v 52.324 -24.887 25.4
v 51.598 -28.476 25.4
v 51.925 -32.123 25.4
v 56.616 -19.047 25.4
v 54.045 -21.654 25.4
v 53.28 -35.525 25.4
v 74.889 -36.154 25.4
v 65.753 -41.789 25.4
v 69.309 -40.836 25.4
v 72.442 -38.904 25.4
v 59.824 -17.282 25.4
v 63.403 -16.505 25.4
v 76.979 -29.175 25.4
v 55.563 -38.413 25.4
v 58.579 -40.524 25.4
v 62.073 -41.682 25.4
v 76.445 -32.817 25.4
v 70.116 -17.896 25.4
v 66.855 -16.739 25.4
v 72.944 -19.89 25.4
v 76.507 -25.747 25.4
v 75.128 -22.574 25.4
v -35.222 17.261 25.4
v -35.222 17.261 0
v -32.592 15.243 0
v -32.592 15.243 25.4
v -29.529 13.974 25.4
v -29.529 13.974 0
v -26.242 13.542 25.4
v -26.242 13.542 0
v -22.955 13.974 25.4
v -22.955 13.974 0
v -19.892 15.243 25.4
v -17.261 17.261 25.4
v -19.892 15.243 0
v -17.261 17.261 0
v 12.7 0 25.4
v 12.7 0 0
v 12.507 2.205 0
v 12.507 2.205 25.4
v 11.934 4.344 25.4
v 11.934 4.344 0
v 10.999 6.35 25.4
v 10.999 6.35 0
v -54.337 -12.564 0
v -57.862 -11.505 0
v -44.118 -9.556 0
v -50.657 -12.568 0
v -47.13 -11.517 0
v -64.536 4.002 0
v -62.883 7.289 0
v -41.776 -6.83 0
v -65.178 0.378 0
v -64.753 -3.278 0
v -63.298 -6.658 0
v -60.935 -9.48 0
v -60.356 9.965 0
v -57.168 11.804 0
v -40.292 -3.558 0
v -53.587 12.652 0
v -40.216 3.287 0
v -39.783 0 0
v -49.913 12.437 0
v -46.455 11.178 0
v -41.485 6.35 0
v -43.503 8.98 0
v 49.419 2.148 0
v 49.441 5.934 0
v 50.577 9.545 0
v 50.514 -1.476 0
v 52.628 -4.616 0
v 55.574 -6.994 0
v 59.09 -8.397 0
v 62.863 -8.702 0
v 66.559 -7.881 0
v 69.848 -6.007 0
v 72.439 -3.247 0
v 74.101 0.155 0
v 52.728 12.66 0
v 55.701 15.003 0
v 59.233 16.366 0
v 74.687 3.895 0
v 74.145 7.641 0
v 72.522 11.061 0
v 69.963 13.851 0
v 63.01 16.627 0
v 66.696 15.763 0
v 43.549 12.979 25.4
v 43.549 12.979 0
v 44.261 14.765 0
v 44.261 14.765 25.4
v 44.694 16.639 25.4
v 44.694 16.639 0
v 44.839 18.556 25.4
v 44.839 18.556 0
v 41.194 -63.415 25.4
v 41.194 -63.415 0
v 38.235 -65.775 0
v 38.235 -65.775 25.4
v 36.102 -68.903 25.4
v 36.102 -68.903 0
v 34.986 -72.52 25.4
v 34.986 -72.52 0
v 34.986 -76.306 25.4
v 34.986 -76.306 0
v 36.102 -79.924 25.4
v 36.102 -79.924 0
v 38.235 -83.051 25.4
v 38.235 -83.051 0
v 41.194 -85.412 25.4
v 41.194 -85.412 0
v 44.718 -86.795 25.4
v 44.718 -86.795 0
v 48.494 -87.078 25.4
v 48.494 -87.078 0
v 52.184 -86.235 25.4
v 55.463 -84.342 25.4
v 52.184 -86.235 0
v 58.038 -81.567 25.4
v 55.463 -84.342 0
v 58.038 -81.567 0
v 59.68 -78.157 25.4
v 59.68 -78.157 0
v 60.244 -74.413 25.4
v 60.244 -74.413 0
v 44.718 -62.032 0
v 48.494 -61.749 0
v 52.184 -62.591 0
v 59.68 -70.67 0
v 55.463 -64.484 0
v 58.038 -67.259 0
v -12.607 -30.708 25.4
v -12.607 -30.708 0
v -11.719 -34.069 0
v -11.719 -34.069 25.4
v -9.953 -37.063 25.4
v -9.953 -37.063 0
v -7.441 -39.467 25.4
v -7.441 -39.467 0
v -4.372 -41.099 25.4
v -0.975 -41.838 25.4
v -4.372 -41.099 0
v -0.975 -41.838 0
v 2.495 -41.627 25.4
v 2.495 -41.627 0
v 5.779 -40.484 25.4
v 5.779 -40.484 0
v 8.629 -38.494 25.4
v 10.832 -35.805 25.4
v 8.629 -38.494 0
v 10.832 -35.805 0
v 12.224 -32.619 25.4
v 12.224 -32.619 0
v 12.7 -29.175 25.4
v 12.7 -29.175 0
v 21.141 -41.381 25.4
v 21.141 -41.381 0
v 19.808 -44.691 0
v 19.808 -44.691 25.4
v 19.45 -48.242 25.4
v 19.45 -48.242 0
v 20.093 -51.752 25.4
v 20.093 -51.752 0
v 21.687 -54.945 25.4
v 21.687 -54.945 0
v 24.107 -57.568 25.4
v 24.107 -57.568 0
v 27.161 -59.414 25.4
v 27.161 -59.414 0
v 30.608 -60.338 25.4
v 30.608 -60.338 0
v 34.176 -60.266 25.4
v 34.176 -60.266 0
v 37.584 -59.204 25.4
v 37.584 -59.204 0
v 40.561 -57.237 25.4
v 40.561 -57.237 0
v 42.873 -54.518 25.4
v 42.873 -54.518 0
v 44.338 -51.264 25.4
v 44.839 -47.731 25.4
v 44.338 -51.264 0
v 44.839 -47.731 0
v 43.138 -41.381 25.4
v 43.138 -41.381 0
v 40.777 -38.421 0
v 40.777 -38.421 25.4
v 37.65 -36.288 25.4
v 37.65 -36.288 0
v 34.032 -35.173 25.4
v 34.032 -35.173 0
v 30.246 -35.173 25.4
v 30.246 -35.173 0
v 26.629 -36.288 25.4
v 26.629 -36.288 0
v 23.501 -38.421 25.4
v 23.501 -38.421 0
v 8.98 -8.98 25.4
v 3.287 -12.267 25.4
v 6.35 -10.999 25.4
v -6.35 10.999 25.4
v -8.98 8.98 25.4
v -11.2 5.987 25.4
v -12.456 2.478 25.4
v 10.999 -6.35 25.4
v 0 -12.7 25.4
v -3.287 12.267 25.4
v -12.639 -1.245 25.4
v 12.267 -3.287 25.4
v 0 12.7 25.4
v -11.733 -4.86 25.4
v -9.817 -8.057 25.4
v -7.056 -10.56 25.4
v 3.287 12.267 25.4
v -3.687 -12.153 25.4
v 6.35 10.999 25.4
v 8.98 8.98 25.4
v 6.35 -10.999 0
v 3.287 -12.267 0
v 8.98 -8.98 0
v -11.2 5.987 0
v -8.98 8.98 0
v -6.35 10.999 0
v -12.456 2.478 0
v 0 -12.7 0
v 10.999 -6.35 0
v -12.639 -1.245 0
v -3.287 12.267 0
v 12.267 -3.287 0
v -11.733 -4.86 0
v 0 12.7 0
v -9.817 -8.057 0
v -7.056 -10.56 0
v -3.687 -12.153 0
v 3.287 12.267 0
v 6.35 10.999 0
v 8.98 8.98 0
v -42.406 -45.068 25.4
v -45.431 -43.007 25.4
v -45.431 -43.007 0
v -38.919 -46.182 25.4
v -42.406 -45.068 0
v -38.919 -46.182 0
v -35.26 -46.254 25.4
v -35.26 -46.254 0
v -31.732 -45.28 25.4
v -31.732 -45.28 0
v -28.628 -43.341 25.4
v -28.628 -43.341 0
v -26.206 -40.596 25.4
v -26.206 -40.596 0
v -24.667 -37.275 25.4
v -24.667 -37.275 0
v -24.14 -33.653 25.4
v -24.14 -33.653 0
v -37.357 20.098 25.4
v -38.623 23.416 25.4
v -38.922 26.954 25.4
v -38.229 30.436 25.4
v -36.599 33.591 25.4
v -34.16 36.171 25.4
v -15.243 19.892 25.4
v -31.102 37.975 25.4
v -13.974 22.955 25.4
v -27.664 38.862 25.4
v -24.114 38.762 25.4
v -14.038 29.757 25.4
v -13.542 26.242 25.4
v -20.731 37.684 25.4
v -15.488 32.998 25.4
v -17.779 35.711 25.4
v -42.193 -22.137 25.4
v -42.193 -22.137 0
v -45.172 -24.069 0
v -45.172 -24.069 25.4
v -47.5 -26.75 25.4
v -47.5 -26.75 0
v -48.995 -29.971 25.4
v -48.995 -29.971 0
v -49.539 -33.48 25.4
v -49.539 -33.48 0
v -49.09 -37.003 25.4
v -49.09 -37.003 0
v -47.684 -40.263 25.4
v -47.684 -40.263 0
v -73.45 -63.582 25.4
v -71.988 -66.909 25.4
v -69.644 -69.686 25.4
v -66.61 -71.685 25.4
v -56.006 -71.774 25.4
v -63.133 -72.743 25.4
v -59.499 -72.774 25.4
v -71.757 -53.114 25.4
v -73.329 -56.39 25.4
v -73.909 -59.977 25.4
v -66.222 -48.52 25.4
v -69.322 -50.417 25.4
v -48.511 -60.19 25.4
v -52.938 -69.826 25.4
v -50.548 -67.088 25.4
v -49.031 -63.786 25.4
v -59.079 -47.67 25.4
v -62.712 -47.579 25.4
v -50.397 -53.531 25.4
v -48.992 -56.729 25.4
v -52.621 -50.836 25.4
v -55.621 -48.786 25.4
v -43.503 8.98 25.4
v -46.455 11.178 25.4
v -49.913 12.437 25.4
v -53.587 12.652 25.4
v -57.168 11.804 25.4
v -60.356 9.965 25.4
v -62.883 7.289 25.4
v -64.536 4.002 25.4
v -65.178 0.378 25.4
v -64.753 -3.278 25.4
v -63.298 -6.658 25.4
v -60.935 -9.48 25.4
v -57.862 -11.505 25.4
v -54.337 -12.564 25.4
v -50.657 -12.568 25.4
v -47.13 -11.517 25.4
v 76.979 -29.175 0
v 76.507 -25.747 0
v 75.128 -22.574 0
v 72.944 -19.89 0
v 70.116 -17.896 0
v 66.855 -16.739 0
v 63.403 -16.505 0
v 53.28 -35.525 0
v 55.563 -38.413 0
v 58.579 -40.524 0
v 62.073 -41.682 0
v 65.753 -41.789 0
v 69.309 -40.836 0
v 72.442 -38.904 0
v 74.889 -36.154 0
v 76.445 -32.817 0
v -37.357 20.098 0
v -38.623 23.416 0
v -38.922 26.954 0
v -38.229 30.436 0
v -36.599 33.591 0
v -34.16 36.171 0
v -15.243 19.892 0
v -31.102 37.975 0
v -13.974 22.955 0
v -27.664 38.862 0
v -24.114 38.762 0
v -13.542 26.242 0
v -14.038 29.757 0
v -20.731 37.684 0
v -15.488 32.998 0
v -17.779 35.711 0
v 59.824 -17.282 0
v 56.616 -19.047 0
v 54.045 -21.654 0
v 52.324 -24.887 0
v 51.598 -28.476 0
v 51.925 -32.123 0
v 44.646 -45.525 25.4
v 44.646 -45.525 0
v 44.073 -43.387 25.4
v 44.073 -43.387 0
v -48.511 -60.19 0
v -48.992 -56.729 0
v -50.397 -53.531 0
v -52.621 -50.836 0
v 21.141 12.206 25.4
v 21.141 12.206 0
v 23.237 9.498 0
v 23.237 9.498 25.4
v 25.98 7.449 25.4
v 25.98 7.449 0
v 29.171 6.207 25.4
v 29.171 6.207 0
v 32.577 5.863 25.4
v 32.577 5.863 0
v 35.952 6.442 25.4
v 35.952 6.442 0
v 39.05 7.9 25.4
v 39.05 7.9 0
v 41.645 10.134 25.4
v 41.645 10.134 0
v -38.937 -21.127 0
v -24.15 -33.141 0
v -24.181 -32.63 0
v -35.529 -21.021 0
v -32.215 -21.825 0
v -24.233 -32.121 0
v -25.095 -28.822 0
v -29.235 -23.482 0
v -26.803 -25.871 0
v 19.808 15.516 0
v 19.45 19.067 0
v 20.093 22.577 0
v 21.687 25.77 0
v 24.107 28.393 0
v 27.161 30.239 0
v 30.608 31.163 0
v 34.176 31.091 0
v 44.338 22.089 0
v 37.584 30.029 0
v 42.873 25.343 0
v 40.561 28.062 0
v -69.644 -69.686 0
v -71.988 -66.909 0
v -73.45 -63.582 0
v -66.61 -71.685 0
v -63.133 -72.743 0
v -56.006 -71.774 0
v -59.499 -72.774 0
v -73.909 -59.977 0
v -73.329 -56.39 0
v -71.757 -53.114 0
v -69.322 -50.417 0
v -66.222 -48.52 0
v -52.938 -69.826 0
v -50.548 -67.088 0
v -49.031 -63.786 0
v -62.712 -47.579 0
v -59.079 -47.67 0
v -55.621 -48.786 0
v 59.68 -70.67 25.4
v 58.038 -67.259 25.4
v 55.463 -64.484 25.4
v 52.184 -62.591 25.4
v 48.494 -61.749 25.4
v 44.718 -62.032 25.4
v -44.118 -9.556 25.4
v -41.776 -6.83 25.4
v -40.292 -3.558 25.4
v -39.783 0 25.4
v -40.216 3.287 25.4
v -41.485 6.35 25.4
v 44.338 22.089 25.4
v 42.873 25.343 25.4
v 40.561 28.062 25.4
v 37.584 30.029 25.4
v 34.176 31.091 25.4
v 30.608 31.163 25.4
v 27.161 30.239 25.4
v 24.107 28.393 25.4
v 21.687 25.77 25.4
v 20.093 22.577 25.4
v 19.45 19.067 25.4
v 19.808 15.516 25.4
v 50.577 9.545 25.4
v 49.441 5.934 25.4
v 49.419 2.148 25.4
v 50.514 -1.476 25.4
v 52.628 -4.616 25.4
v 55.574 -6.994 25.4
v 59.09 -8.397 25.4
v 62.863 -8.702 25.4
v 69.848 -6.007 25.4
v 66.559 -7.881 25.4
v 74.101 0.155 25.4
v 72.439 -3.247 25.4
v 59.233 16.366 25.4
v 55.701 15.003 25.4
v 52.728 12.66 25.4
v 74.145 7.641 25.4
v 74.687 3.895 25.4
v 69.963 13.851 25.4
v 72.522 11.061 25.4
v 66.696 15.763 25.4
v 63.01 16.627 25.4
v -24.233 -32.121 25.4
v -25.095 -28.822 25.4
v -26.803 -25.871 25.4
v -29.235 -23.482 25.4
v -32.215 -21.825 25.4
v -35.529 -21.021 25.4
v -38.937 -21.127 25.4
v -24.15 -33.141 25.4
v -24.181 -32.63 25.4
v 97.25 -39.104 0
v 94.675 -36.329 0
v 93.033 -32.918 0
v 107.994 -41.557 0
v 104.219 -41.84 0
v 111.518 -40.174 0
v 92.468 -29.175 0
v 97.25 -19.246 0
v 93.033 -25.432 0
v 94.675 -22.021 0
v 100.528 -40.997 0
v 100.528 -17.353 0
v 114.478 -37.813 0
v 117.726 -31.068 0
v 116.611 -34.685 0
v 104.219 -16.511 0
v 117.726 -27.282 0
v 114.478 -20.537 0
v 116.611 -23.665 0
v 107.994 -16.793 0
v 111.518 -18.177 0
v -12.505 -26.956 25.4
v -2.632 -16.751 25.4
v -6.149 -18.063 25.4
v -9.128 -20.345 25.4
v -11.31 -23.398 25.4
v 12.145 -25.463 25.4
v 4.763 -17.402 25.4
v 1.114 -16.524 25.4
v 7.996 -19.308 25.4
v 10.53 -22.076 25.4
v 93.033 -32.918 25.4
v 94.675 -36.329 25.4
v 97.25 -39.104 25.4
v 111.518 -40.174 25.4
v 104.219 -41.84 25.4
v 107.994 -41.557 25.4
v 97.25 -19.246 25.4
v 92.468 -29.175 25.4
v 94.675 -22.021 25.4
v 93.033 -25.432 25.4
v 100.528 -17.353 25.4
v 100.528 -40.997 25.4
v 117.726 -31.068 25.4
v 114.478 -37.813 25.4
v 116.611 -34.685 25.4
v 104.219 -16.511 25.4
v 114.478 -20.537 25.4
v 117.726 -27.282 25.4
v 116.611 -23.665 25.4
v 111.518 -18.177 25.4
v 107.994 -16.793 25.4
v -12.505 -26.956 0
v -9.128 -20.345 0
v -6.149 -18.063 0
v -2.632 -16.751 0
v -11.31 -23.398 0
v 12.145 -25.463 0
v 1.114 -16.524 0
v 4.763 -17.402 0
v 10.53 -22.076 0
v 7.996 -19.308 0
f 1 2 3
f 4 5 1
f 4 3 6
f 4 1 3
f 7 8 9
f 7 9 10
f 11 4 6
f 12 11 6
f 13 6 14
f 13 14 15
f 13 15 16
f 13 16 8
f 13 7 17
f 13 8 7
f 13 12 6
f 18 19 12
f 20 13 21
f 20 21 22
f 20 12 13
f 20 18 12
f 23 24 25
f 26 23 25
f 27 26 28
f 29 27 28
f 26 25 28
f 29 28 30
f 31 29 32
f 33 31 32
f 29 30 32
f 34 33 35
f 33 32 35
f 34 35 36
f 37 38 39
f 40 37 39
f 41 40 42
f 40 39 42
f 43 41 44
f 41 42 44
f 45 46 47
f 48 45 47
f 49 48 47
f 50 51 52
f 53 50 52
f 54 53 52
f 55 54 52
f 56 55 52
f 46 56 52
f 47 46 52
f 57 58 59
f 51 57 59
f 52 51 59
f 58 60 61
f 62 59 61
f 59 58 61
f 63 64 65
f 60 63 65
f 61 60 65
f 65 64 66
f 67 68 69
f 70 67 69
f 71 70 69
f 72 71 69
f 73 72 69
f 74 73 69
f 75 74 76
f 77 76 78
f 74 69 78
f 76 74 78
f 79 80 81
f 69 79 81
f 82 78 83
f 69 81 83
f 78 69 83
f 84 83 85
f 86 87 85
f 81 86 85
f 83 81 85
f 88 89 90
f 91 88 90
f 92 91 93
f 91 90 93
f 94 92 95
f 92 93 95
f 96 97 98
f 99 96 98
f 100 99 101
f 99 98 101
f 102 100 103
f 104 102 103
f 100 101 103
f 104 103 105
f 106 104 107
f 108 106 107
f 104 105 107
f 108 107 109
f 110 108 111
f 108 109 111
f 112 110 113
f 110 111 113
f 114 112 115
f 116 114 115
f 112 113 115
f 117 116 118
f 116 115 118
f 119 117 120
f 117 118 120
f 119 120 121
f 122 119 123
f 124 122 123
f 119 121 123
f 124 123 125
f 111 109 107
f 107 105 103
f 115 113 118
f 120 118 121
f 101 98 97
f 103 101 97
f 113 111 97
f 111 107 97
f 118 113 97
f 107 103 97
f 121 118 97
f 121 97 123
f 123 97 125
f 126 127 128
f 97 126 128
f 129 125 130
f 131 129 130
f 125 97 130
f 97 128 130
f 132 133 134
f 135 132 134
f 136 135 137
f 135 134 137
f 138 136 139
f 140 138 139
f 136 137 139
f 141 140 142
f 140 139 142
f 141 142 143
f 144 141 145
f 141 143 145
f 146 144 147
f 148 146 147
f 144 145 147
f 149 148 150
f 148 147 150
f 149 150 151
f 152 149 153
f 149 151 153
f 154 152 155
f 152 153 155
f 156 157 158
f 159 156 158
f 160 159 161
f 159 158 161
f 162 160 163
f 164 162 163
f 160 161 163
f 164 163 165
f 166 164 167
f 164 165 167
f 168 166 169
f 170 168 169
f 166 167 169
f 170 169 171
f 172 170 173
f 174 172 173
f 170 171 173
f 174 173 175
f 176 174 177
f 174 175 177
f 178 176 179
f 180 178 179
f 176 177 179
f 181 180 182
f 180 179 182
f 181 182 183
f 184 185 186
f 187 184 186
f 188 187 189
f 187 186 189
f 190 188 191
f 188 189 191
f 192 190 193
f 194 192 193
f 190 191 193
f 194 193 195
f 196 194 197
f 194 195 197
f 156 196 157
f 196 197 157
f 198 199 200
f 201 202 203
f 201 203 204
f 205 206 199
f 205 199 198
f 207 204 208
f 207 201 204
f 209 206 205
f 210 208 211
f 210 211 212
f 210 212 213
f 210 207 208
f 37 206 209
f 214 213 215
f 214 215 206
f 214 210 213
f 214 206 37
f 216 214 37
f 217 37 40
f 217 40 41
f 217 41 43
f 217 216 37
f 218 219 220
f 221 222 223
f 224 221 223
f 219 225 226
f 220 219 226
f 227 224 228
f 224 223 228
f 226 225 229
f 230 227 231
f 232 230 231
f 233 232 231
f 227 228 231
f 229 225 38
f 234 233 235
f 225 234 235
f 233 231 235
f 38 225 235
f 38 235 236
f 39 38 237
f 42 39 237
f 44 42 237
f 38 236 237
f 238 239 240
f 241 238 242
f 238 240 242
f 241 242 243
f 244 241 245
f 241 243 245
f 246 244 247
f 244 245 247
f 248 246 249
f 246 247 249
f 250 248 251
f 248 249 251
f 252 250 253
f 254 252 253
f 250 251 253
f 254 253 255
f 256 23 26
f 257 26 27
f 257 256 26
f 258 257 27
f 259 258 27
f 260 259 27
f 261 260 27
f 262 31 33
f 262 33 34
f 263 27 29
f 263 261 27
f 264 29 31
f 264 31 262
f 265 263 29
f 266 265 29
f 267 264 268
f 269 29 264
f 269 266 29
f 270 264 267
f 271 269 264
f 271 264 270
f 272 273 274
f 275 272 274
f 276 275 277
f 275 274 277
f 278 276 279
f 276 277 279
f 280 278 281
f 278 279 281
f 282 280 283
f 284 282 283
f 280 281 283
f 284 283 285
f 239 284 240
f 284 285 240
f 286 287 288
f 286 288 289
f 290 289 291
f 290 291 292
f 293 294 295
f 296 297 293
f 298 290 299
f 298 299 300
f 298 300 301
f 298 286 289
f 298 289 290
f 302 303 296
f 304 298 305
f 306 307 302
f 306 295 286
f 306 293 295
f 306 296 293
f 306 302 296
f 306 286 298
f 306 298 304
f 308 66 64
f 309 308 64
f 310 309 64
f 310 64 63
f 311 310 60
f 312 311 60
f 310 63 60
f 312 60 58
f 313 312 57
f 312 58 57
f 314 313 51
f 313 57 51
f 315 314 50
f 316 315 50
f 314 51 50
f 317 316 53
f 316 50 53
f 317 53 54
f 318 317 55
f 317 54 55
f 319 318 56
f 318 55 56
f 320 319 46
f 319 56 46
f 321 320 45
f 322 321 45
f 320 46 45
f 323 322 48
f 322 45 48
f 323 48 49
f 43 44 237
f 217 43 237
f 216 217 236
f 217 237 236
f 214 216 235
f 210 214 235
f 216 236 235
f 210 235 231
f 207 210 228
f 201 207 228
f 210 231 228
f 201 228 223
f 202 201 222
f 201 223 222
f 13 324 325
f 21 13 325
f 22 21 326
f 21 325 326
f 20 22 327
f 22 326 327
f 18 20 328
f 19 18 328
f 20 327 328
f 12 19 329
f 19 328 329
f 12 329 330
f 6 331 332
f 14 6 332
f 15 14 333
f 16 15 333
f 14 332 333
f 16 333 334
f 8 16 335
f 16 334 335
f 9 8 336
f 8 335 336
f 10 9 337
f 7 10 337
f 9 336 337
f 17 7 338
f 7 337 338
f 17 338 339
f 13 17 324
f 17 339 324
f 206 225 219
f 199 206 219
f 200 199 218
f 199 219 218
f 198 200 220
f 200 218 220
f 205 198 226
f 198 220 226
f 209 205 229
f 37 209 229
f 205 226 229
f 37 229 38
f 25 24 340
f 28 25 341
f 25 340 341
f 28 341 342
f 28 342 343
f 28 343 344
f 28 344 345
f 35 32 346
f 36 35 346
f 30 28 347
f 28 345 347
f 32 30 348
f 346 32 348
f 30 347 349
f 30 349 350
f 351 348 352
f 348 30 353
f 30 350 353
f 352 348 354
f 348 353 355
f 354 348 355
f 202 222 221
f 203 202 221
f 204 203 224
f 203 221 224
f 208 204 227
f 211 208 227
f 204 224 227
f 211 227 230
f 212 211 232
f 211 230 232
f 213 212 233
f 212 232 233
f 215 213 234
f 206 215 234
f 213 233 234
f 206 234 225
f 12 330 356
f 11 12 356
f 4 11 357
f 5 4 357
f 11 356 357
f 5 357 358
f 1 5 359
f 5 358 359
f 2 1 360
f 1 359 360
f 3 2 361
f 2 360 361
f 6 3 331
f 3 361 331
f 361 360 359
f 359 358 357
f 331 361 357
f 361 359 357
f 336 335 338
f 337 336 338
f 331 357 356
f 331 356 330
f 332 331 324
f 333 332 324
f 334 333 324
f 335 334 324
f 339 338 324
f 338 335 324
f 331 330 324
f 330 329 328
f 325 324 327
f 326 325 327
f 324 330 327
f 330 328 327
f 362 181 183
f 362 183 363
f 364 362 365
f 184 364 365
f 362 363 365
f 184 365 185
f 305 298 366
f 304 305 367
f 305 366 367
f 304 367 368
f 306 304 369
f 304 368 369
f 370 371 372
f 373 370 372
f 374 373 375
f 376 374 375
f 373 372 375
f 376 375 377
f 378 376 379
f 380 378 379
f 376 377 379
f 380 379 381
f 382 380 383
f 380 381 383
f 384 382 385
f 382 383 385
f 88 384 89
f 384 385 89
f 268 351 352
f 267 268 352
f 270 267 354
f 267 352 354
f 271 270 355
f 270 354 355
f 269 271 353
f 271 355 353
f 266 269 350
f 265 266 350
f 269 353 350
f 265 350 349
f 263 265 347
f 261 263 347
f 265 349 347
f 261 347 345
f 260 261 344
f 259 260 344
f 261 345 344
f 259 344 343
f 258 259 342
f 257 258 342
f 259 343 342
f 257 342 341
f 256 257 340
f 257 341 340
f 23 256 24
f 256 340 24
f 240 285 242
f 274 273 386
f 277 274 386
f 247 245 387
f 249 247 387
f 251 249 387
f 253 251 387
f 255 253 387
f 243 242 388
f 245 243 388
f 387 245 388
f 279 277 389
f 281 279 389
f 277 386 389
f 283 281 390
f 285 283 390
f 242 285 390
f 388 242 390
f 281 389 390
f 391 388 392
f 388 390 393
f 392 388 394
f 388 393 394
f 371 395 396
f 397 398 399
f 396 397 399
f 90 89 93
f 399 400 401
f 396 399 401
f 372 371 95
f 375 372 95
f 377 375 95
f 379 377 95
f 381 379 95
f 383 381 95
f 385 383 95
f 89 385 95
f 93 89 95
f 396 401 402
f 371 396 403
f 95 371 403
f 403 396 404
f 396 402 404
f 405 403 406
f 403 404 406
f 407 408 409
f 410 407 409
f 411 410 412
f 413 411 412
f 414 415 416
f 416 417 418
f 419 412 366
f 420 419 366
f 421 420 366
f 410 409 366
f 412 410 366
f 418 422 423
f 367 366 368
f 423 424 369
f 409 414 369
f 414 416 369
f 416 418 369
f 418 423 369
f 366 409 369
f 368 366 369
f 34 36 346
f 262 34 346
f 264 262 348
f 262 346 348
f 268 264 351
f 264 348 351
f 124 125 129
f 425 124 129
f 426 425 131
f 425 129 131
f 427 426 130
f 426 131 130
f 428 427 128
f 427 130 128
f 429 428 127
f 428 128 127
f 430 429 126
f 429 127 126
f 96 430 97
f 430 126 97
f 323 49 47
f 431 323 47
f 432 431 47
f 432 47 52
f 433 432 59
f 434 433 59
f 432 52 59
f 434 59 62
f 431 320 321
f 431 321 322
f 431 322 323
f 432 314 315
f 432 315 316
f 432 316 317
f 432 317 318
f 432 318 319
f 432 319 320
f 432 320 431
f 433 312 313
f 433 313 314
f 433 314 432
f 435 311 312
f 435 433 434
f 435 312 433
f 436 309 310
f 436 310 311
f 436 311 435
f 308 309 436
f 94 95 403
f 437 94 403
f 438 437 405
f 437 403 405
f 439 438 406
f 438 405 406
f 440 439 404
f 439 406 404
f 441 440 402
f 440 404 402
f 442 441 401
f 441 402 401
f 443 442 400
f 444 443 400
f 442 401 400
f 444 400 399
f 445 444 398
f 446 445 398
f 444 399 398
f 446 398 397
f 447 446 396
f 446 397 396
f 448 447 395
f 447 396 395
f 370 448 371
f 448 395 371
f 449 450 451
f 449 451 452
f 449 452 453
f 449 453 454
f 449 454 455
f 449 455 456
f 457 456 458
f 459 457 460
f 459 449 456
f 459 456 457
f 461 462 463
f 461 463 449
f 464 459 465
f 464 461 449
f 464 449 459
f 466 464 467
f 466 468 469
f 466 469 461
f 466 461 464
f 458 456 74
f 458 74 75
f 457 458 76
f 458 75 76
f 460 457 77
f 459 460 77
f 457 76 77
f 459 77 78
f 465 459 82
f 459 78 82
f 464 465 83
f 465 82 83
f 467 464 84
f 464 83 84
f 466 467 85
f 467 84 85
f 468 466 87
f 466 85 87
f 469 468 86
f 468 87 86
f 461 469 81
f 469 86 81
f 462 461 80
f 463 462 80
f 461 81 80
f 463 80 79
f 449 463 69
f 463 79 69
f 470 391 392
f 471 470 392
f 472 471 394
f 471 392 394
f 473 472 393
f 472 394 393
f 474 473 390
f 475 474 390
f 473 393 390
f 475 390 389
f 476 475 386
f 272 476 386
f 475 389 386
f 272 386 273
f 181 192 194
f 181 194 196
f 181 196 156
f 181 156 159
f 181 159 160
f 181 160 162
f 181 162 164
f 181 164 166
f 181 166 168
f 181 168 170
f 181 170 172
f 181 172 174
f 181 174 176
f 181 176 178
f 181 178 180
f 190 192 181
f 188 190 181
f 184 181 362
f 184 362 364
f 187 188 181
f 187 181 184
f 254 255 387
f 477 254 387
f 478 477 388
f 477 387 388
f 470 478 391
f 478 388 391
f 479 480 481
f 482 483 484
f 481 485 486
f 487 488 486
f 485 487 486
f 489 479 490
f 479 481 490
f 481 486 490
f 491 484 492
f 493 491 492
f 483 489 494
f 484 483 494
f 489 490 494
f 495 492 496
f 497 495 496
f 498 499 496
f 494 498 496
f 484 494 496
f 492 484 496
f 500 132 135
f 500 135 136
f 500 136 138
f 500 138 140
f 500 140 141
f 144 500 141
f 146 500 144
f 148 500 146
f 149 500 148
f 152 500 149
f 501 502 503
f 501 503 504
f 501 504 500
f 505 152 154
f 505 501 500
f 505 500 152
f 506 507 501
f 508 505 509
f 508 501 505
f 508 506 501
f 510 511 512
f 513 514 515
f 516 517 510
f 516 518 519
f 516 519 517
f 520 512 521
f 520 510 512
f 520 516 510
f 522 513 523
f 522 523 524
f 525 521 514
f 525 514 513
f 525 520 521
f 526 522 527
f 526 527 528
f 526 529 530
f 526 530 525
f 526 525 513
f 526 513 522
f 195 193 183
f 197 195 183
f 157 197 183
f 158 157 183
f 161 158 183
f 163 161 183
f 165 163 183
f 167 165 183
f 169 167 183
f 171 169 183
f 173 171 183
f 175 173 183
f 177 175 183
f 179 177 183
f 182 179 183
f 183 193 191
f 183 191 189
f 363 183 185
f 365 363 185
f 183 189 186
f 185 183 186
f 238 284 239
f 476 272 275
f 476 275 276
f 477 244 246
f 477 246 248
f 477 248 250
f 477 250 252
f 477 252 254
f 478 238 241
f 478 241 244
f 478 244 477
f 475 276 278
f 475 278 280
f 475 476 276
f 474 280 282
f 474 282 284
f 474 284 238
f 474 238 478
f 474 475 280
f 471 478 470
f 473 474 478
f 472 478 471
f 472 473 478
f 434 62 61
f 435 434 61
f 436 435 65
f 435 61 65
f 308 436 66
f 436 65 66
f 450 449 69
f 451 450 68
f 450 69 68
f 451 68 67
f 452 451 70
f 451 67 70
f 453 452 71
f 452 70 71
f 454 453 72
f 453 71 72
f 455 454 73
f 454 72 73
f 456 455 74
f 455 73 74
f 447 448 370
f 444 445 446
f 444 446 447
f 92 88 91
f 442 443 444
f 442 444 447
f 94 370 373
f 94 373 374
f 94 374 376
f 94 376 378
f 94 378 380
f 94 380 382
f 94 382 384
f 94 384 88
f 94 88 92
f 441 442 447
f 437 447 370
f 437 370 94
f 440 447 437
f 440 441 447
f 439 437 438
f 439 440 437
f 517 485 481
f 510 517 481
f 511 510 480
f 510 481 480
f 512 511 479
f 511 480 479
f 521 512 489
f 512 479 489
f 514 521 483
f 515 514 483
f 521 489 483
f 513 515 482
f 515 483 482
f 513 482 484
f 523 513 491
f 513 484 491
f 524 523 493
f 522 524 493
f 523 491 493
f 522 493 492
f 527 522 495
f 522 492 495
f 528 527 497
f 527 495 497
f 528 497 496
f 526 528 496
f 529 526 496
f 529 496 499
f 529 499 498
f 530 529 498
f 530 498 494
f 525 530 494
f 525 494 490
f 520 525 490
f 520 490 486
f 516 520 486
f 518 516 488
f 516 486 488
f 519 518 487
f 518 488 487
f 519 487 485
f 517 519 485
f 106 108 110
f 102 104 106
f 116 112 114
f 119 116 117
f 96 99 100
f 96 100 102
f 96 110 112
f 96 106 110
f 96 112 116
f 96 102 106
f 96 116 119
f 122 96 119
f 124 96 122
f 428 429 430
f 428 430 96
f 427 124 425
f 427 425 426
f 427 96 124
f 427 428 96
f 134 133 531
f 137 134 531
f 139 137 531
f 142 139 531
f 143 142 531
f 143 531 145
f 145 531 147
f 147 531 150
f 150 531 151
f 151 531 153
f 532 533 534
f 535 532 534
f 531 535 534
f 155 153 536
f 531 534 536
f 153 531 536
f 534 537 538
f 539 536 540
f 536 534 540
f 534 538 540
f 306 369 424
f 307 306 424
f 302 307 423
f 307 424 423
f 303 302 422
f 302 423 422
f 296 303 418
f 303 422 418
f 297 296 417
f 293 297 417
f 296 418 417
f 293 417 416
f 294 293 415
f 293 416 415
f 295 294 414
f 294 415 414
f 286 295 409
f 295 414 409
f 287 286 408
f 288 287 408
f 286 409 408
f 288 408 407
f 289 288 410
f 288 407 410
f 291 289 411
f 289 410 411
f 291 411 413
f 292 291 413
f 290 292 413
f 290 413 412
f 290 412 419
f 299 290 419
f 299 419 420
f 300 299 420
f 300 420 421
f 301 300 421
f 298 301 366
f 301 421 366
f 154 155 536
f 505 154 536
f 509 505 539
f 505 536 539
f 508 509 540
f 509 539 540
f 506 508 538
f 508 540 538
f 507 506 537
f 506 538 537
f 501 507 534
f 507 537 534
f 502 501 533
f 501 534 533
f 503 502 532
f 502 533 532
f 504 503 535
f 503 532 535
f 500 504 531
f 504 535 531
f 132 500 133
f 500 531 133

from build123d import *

# Parameters (mm, degrees)
F1_DEPTH = 25.4


with BuildPart() as f1:
    # F0 (on Top) → F1 (new body)
    with BuildSketch(Plane.XY):
        with BuildLine():
            Line((-52.4831996534, 0), (-43.5029435323, 8.9802561211))
            ThreePointArc((-43.5029435323, 8.9802561211), (-64.9889206945, 2.2129033509), (-47.1298883319, -11.5165992331))
            Line((-47.1298883319, -11.5165992331), (-52.4831996534, 0))
        make_face()
        with BuildLine():
            ThreePointArc((-39.7831996534, 0), (-40.7499295905, 4.860079591), (-43.5029435323, 8.9802561211))
            Line((-43.5029435323, 8.9802561211), (-52.4831996534, 0))
            Line((-52.4831996534, 0), (-47.1298883319, -11.5165992331))
            ThreePointArc((-47.1298883319, -11.5165992331), (-41.776261394, -6.8301883655), (-39.7831996534, 0))
        make_face()
    extrude(amount=F1_DEPTH)


with BuildPart() as f1b:
    # F0 (on Top) → F1, piece 2 (new body)
    with BuildSketch(Plane.XY):
        with BuildLine():
            Line((-26.2415998267, 26.2415998267), (-17.2613437056, 17.2613437056))
            ThreePointArc((-17.2613437056, 17.2613437056), (-14.5083297638, 21.3815202357), (-13.5415998267, 26.2415998267))
            ThreePointArc((-13.5415998267, 26.2415998267), (-31.1016794177, 37.9748698896), (-35.2218559478, 17.2613437056))
            Line((-35.2218559478, 17.2613437056), (-26.2415998267, 26.2415998267))
        make_face()
        with BuildLine():
            ThreePointArc((-35.2218559478, 17.2613437056), (-26.2415998267, 13.5415998267), (-17.2613437056, 17.2613437056))
            Line((-17.2613437056, 17.2613437056), (-26.2415998267, 26.2415998267))
            Line((-26.2415998267, 26.2415998267), (-35.2218559478, 17.2613437056))
        make_face()
    extrude(amount=F1_DEPTH)


with BuildPart() as f1c:
    # F0 (on Top) → F1, piece 3 (new body)
    with BuildSketch(Plane.XY):
        with BuildLine():
            ThreePointArc((-8.9802561211, 8.9802561211), (-11.7332700629, -4.860079591), (0, -12.7))
            Line((0, -12.7), (0, 0))
            Line((0, 0), (-8.9802561211, 8.9802561211))
        make_face()
        with BuildLine():
            Line((0, 0), (10.9985226281, 6.35))
            ThreePointArc((10.9985226281, 6.35), (1.6576826412, 12.5913497394), (-8.9802561211, 8.9802561211))
            Line((-8.9802561211, 8.9802561211), (0, 0))
        make_face()
        with BuildLine():
            ThreePointArc((0, -12.7), (8.9802561211, -8.9802561211), (12.7, 0))
            ThreePointArc((12.7, 0), (12.2672579939, 3.2870018728), (10.9985226281, 6.35))
            Line((10.9985226281, 6.35), (0, 0))
            Line((0, 0), (0, -12.7))
        make_face()
    extrude(amount=F1_DEPTH)


with BuildPart() as f1d:
    # F0 (on Top) → F1, piece 4 (new body)
    with BuildSketch(Plane.XY):
        with BuildLine():
            Line((0, -29.1750417436), (0, -16.4750417436))
            ThreePointArc((0, -16.4750417436), (-9.5066412192, -20.7540101721), (-12.6072009207, -30.7075184792))
            Line((-12.6072009207, -30.7075184792), (0, -29.1750417436))
        make_face()
        with BuildLine():
            Line((0, -29.1750417436), (-12.6072009207, -30.7075184792))
            ThreePointArc((-12.6072009207, -30.7075184792), (-2.5395066574, -41.6185503299), (10.9985226281, -35.5250417436))
            Line((10.9985226281, -35.5250417436), (0, -29.1750417436))
        make_face()
        with BuildLine():
            ThreePointArc((12.7, -29.1750417436), (8.9802561211, -20.1947856225), (0, -16.4750417436))
            Line((0, -16.4750417436), (0, -29.1750417436))
            Line((0, -29.1750417436), (10.9985226281, -35.5250417436))
            ThreePointArc((10.9985226281, -35.5250417436), (12.2672579939, -32.4620436164), (12.7, -29.1750417436))
        make_face()
    extrude(amount=F1_DEPTH)


with BuildPart() as f1e:
    # F0 (on Top) → F1, piece 5 (new body)
    with BuildSketch(Plane.XY):
        with BuildLine():
            ThreePointArc((-24.1400541182, -33.6531591488), (-24.163275117, -32.8855172052), (-24.2328531975, -32.1206824132))
            Line((-24.2328531975, -32.1206824132), (-36.8400541182, -33.6531591488))
            Line((-36.8400541182, -33.6531591488), (-45.43055476, -43.0069444105))
            ThreePointArc((-45.43055476, -43.0069444105), (-31.7316961703, -45.2804838228), (-24.1400541182, -33.6531591488))
        make_face()
        with BuildLine():
            Line((-36.8400541182, -33.6531591488), (-24.2328531975, -32.1206824132))
            ThreePointArc((-24.2328531975, -32.1206824132), (-30.6695270669, -22.5529521278), (-42.1933654397, -22.1365599157))
            Line((-42.1933654397, -22.1365599157), (-36.8400541182, -33.6531591488))
        make_face()
        with BuildLine():
            Line((-36.8400541182, -33.6531591488), (-42.1933654397, -22.1365599157))
            ThreePointArc((-42.1933654397, -22.1365599157), (-49.3899828135, -31.7065493413), (-45.43055476, -43.0069444105))
            Line((-45.43055476, -43.0069444105), (-36.8400541182, -33.6531591488))
        make_face()
    extrude(amount=F1_DEPTH)


with BuildPart() as f1f:
    # F0 (on Top) → F1, piece 6 (new body)
    with BuildSketch(Plane.XY):
        with BuildLine():
            ThreePointArc((-48.511142689, -60.1896718144), (-49.5838180149, -55.0813138665), (-52.6206420472, -50.8358865527))
            ThreePointArc((-52.6206420472, -50.8358865527), (-72.838467363, -65.2980297624), (-48.511142689, -60.1896718144))
        make_face()
    extrude(amount=F1_DEPTH)


with BuildPart() as f1g:
    # F0 (on Top) → F1, piece 7 (new body)
    with BuildSketch(Plane.XY):
        with BuildLine():
            ThreePointArc((43.1377874329, -41.3806549302), (32.1392648048, -35.0306549302), (21.1407421768, -41.3806549302))
            Line((21.1407421768, -41.3806549302), (32.1392648048, -47.7306549302))
            Line((32.1392648048, -47.7306549302), (43.1377874329, -41.3806549302))
        make_face()
        with BuildLine():
            Line((32.1392648048, -47.7306549302), (21.1407421768, -41.3806549302))
            ThreePointArc((21.1407421768, -41.3806549302), (23.1590086838, -56.7109110513), (38.4892648048, -58.7291775583))
            Line((38.4892648048, -58.7291775583), (32.1392648048, -47.7306549302))
        make_face()
        with BuildLine():
            Line((43.1377874329, -41.3806549302), (32.1392648048, -47.7306549302))
            Line((32.1392648048, -47.7306549302), (38.4892648048, -58.7291775583))
            ThreePointArc((38.4892648048, -58.7291775583), (43.1377874329, -54.0806549302), (44.8392648048, -47.7306549302))
            ThreePointArc((44.8392648048, -47.7306549302), (44.4065227987, -44.4436530574), (43.1377874329, -41.3806549302))
        make_face()
    extrude(amount=F1_DEPTH)


with BuildPart() as f1h:
    # F0 (on Top) → F1, piece 8 (new body)
    with BuildSketch(Plane.XY):
        with BuildLine():
            ThreePointArc((60.2444479138, -74.4132147749), (53.8944479138, -63.4146921468), (41.1944479138, -63.4146921468))
            ThreePointArc((41.1944479138, -63.4146921468), (41.1944479138, -85.411737403), (60.2444479138, -74.4132147749))
        make_face()
    extrude(amount=F1_DEPTH)


with BuildPart() as f1i:
    # F0 (on Top) → F1, piece 9 (new body)
    with BuildSketch(Plane.XY):
        with BuildLine():
            ThreePointArc((53.2800069816, -35.5250417436), (67.5655314825, -41.4422997375), (76.9785296097, -29.1750417436))
            Line((76.9785296097, -29.1750417436), (64.2785296097, -29.1750417436))
            Line((64.2785296097, -29.1750417436), (53.2800069816, -35.5250417436))
        make_face()
        with BuildLine():
            Line((64.2785296097, -29.1750417436), (63.4027472219, -16.5052743736))
            ThreePointArc((63.4027472219, -16.5052743736), (53.0674784723, -23.2082727355), (53.2800069816, -35.5250417436))
            Line((53.2800069816, -35.5250417436), (64.2785296097, -29.1750417436))
        make_face()
        with BuildLine():
            ThreePointArc((76.9785296097, -29.1750417436), (72.9436194441, -19.8903113672), (63.4027472219, -16.5052743736))
            Line((63.4027472219, -16.5052743736), (64.2785296097, -29.1750417436))
            Line((64.2785296097, -29.1750417436), (76.9785296097, -29.1750417436))
        make_face()
    extrude(amount=F1_DEPTH)


with BuildPart() as f1j:
    # F0 (on Top) → F1, piece 10 (new body)
    with BuildSketch(Plane.XY):
        with BuildLine():
            ThreePointArc((117.8683108519, -29.1750417436), (105.1683108519, -16.4750417436), (92.4683108519, -29.1750417436))
            ThreePointArc((92.4683108519, -29.1750417436), (105.1683108519, -41.8750417436), (117.8683108519, -29.1750417436))
        make_face()
    extrude(amount=F1_DEPTH)


with BuildPart() as f1k:
    # F0 (on Top) → F1, piece 11 (new body)
    with BuildSketch(Plane.XY):
        with BuildLine():
            ThreePointArc((74.6875504436, 3.9680923148), (64.849373178, 16.3414496053), (50.5773188472, 9.5445262038))
            Line((50.5773188472, 9.5445262038), (61.9875504436, 3.9680923148))
            Line((61.9875504436, 3.9680923148), (62.8633328313, -8.7016750551))
            ThreePointArc((62.8633328313, -8.7016750551), (71.27228082, -4.6969975195), (74.6875504436, 3.9680923148))
        make_face()
        with BuildLine():
            Line((61.9875504436, 3.9680923148), (50.5773188472, 9.5445262038))
            ThreePointArc((50.5773188472, 9.5445262038), (51.453101235, -3.1252411662), (62.8633328313, -8.7016750551))
            Line((62.8633328313, -8.7016750551), (61.9875504436, 3.9680923148))
        make_face()
    extrude(amount=F1_DEPTH)


with BuildPart() as f1l:
    # F0 (on Top) → F1, piece 12 (new body)
    with BuildSketch(Plane.XY):
        with BuildLine():
            Line((32.1392648048, 18.5556131866), (21.1407421768, 12.2056131866))
            ThreePointArc((21.1407421768, 12.2056131866), (32.577416834, 5.8631735945), (43.5494964012, 12.9791792977))
            Line((43.5494964012, 12.9791792977), (32.1392648048, 18.5556131866))
        make_face()
        with BuildLine():
            ThreePointArc((44.8392648048, 18.5556131866), (28.852262932, 30.8228711805), (21.1407421768, 12.2056131866))
            Line((21.1407421768, 12.2056131866), (32.1392648048, 18.5556131866))
            Line((32.1392648048, 18.5556131866), (43.5494964012, 12.9791792977))
            ThreePointArc((43.5494964012, 12.9791792977), (44.5126220953, 15.6937904522), (44.8392648048, 18.5556131866))
        make_face()
    extrude(amount=F1_DEPTH)


solid = Compound([f1.part, f1b.part, f1c.part, f1d.part, f1e.part, f1f.part, f1g.part, f1h.part, f1i.part, f1j.part, f1k.part, f1l.part])
